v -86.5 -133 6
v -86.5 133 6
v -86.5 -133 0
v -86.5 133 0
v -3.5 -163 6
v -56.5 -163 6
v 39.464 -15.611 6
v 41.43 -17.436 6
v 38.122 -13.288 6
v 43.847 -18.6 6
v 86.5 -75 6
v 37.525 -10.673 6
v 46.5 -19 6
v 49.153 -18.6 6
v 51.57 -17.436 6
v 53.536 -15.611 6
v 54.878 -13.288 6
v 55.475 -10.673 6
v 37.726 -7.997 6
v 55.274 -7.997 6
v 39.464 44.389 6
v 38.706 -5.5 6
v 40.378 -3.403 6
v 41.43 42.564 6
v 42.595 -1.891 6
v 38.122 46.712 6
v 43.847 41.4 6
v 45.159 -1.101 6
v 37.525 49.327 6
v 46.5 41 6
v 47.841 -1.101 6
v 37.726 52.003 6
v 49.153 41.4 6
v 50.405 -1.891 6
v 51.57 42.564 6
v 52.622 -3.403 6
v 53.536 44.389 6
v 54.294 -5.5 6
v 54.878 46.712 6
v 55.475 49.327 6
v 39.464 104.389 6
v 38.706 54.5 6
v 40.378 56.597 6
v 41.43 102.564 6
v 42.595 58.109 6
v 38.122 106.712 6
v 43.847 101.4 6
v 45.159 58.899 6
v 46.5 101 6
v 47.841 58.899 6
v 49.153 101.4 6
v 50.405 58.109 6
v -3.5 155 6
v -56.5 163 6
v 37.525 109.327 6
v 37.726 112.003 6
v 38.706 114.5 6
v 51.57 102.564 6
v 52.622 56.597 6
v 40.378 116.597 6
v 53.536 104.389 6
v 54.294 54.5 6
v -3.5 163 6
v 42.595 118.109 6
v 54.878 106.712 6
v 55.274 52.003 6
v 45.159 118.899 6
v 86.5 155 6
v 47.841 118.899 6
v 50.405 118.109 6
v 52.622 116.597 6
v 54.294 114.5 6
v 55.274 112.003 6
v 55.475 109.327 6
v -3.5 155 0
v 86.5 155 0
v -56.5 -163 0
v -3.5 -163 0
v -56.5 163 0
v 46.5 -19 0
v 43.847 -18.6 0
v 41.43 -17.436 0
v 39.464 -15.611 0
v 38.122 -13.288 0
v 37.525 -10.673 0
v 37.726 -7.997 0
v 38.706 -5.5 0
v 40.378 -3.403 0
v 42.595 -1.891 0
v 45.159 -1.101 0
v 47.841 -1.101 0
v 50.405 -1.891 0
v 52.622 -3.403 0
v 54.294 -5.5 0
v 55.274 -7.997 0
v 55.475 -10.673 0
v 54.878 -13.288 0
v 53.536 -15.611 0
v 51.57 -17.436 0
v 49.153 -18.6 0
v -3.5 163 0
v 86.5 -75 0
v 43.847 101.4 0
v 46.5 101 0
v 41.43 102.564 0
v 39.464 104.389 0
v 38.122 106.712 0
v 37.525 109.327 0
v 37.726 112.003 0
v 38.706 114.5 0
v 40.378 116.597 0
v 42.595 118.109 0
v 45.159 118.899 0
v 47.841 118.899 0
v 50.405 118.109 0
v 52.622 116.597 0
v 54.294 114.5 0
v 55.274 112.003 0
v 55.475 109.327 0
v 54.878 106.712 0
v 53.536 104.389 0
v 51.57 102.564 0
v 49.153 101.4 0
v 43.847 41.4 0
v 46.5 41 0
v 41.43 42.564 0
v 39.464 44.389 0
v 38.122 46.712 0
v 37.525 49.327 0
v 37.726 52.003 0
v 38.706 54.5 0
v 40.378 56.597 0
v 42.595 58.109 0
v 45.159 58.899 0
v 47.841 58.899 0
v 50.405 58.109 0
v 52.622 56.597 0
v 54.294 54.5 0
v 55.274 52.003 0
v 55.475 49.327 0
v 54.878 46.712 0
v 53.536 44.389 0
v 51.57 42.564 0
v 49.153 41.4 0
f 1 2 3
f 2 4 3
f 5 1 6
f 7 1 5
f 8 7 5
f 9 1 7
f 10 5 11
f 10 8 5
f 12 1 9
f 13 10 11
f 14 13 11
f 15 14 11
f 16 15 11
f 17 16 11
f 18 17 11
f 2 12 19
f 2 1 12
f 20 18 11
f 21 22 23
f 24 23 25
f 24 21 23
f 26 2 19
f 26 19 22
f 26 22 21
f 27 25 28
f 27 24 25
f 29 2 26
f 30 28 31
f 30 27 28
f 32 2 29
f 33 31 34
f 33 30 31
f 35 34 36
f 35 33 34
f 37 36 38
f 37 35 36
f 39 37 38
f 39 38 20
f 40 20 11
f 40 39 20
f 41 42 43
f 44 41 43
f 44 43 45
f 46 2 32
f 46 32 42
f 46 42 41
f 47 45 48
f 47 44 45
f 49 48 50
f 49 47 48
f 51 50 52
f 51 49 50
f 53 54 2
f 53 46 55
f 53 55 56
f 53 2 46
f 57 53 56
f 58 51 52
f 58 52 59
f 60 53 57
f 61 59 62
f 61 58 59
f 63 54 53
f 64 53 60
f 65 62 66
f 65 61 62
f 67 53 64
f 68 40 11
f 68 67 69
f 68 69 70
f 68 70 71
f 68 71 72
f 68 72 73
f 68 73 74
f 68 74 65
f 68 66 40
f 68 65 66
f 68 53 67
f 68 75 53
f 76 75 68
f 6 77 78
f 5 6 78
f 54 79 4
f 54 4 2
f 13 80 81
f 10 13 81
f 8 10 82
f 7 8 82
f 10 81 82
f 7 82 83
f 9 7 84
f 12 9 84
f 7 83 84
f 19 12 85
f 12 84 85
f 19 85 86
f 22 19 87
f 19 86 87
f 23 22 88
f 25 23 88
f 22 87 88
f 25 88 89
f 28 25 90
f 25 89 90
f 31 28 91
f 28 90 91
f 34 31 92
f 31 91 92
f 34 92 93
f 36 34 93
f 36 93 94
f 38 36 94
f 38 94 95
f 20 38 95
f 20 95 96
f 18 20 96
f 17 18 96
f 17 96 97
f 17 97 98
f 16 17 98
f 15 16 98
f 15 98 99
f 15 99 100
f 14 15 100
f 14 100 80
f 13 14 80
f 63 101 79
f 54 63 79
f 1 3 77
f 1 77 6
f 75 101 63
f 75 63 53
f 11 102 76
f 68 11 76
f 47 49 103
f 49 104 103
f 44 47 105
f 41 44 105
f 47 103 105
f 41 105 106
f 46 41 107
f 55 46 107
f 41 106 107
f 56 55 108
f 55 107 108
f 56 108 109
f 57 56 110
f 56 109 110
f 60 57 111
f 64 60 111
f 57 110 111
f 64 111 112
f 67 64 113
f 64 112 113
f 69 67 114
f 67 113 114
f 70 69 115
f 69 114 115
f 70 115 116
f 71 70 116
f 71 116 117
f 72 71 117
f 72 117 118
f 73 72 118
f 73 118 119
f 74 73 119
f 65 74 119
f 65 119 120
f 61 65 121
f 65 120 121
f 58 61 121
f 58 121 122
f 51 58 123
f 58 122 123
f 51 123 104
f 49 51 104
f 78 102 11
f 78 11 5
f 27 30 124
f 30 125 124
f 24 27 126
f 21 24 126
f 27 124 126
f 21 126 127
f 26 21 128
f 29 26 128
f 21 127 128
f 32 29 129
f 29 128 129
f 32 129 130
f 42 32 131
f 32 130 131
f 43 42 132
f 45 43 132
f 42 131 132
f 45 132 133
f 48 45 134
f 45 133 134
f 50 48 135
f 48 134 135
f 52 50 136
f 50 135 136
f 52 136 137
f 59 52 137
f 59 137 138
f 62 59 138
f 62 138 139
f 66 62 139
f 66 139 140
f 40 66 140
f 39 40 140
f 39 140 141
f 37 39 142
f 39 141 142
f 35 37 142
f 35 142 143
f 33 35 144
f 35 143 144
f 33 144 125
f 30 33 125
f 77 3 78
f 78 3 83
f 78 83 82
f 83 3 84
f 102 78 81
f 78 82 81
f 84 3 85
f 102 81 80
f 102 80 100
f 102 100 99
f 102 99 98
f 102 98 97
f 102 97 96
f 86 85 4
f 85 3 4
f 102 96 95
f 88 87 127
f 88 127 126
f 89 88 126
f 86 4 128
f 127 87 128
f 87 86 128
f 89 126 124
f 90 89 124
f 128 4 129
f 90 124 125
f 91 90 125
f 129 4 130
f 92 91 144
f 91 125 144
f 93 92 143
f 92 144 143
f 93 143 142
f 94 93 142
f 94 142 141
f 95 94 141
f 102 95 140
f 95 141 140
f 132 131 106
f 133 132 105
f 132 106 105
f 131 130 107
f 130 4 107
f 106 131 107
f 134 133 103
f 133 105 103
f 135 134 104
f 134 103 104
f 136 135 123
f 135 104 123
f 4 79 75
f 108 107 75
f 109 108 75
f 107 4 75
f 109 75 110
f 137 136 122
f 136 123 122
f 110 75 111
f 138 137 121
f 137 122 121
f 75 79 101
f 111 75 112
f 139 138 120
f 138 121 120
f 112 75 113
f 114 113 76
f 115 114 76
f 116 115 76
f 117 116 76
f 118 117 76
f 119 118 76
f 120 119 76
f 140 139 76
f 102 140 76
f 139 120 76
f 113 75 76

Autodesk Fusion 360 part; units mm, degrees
sketch "スケッチ1" plane through (0, 0, 0) normal (0, 0, 1) x (1, 0, 0)
  line L0 (-3.5, 163) -> (-86.5, 163)
  line L1 (-86.5, 163) -> (-86.5, -163)
  line L2 (-86.5, -163) -> (-3.5, -163)
  line L3 (86.5, -75) -> (86.5, 155)
  line L4 (82.2546, 155) -> (-86.5, -163) construction
  line L5 (-86.5, 163) -> (55.7541, -105.0627) construction
  line L6 (-3.5, 163) -> (-3.5, 155)
  line L7 (-3.5, 155) -> (86.5, 155)
  line L8 (-86.5, -163) -> (-3.5, -163) construction
  line L9 (86.5, -75) -> (-3.5, -163)
  dimension "d2" = 326
  dimension "d5" = 83
extrude "押し出し1" add sketch "スケッチ1" along normal blind 6
chamfer "面取り1" distance 30 angle 45 2 edges at (-86.5, -163, 3) (-86.5, 163, 3)
sketch "スケッチ2" plane through (0, 0, 6) normal (0, 0, 1) x (-1, 0, 0)
  line L0 (56.5, -163) -> (86.5, -133)
  line L1 (86.5, -133) -> (86.5, 133)
  line L2 (86.5, 133) -> (56.5, 163)
  line L3 (56.5, 163) -> (3.5, 163)
  line L4 (3.5, 163) -> (-86.5, 75)
  line L5 (-86.5, 75) -> (-86.5, -155)
  line L6 (-86.5, -155) -> (3.5, -155)
  line L7 (3.5, -155) -> (3.5, -163)
  line L8 (3.5, -163) -> (56.5, -163)
  line L9 (-86.5, -155) -> (-46.5, -155) construction
  line L10 (-46.5, -155) -> (-46.5, -110) construction
  line L11 (-46.5, -110) -> (-86.5, -110) construction
  line L12 (-86.5, -110) -> (-86.5, -155) construction
  line L13 (-46.5, -110) -> (-46.5, -50) construction
  line L14 (-46.5, -50) -> (-46.5, 10) construction
  point P0 (-46.5, -110)
  point P1 (-46.5, -50)
  point P2 (-46.5, 10)
  dimension "d10" = 40
  dimension "d11" = 45
  dimension "d12" = 60
  dimension "d13" = 60
hole "穴1" at (46.5, 110, 6) at (46.5, 50, 6) at (46.5, -10, 6) direction (0, 0, -1) diameter 18 end through all
equation "d5 = 30 mm + 53 mm"
